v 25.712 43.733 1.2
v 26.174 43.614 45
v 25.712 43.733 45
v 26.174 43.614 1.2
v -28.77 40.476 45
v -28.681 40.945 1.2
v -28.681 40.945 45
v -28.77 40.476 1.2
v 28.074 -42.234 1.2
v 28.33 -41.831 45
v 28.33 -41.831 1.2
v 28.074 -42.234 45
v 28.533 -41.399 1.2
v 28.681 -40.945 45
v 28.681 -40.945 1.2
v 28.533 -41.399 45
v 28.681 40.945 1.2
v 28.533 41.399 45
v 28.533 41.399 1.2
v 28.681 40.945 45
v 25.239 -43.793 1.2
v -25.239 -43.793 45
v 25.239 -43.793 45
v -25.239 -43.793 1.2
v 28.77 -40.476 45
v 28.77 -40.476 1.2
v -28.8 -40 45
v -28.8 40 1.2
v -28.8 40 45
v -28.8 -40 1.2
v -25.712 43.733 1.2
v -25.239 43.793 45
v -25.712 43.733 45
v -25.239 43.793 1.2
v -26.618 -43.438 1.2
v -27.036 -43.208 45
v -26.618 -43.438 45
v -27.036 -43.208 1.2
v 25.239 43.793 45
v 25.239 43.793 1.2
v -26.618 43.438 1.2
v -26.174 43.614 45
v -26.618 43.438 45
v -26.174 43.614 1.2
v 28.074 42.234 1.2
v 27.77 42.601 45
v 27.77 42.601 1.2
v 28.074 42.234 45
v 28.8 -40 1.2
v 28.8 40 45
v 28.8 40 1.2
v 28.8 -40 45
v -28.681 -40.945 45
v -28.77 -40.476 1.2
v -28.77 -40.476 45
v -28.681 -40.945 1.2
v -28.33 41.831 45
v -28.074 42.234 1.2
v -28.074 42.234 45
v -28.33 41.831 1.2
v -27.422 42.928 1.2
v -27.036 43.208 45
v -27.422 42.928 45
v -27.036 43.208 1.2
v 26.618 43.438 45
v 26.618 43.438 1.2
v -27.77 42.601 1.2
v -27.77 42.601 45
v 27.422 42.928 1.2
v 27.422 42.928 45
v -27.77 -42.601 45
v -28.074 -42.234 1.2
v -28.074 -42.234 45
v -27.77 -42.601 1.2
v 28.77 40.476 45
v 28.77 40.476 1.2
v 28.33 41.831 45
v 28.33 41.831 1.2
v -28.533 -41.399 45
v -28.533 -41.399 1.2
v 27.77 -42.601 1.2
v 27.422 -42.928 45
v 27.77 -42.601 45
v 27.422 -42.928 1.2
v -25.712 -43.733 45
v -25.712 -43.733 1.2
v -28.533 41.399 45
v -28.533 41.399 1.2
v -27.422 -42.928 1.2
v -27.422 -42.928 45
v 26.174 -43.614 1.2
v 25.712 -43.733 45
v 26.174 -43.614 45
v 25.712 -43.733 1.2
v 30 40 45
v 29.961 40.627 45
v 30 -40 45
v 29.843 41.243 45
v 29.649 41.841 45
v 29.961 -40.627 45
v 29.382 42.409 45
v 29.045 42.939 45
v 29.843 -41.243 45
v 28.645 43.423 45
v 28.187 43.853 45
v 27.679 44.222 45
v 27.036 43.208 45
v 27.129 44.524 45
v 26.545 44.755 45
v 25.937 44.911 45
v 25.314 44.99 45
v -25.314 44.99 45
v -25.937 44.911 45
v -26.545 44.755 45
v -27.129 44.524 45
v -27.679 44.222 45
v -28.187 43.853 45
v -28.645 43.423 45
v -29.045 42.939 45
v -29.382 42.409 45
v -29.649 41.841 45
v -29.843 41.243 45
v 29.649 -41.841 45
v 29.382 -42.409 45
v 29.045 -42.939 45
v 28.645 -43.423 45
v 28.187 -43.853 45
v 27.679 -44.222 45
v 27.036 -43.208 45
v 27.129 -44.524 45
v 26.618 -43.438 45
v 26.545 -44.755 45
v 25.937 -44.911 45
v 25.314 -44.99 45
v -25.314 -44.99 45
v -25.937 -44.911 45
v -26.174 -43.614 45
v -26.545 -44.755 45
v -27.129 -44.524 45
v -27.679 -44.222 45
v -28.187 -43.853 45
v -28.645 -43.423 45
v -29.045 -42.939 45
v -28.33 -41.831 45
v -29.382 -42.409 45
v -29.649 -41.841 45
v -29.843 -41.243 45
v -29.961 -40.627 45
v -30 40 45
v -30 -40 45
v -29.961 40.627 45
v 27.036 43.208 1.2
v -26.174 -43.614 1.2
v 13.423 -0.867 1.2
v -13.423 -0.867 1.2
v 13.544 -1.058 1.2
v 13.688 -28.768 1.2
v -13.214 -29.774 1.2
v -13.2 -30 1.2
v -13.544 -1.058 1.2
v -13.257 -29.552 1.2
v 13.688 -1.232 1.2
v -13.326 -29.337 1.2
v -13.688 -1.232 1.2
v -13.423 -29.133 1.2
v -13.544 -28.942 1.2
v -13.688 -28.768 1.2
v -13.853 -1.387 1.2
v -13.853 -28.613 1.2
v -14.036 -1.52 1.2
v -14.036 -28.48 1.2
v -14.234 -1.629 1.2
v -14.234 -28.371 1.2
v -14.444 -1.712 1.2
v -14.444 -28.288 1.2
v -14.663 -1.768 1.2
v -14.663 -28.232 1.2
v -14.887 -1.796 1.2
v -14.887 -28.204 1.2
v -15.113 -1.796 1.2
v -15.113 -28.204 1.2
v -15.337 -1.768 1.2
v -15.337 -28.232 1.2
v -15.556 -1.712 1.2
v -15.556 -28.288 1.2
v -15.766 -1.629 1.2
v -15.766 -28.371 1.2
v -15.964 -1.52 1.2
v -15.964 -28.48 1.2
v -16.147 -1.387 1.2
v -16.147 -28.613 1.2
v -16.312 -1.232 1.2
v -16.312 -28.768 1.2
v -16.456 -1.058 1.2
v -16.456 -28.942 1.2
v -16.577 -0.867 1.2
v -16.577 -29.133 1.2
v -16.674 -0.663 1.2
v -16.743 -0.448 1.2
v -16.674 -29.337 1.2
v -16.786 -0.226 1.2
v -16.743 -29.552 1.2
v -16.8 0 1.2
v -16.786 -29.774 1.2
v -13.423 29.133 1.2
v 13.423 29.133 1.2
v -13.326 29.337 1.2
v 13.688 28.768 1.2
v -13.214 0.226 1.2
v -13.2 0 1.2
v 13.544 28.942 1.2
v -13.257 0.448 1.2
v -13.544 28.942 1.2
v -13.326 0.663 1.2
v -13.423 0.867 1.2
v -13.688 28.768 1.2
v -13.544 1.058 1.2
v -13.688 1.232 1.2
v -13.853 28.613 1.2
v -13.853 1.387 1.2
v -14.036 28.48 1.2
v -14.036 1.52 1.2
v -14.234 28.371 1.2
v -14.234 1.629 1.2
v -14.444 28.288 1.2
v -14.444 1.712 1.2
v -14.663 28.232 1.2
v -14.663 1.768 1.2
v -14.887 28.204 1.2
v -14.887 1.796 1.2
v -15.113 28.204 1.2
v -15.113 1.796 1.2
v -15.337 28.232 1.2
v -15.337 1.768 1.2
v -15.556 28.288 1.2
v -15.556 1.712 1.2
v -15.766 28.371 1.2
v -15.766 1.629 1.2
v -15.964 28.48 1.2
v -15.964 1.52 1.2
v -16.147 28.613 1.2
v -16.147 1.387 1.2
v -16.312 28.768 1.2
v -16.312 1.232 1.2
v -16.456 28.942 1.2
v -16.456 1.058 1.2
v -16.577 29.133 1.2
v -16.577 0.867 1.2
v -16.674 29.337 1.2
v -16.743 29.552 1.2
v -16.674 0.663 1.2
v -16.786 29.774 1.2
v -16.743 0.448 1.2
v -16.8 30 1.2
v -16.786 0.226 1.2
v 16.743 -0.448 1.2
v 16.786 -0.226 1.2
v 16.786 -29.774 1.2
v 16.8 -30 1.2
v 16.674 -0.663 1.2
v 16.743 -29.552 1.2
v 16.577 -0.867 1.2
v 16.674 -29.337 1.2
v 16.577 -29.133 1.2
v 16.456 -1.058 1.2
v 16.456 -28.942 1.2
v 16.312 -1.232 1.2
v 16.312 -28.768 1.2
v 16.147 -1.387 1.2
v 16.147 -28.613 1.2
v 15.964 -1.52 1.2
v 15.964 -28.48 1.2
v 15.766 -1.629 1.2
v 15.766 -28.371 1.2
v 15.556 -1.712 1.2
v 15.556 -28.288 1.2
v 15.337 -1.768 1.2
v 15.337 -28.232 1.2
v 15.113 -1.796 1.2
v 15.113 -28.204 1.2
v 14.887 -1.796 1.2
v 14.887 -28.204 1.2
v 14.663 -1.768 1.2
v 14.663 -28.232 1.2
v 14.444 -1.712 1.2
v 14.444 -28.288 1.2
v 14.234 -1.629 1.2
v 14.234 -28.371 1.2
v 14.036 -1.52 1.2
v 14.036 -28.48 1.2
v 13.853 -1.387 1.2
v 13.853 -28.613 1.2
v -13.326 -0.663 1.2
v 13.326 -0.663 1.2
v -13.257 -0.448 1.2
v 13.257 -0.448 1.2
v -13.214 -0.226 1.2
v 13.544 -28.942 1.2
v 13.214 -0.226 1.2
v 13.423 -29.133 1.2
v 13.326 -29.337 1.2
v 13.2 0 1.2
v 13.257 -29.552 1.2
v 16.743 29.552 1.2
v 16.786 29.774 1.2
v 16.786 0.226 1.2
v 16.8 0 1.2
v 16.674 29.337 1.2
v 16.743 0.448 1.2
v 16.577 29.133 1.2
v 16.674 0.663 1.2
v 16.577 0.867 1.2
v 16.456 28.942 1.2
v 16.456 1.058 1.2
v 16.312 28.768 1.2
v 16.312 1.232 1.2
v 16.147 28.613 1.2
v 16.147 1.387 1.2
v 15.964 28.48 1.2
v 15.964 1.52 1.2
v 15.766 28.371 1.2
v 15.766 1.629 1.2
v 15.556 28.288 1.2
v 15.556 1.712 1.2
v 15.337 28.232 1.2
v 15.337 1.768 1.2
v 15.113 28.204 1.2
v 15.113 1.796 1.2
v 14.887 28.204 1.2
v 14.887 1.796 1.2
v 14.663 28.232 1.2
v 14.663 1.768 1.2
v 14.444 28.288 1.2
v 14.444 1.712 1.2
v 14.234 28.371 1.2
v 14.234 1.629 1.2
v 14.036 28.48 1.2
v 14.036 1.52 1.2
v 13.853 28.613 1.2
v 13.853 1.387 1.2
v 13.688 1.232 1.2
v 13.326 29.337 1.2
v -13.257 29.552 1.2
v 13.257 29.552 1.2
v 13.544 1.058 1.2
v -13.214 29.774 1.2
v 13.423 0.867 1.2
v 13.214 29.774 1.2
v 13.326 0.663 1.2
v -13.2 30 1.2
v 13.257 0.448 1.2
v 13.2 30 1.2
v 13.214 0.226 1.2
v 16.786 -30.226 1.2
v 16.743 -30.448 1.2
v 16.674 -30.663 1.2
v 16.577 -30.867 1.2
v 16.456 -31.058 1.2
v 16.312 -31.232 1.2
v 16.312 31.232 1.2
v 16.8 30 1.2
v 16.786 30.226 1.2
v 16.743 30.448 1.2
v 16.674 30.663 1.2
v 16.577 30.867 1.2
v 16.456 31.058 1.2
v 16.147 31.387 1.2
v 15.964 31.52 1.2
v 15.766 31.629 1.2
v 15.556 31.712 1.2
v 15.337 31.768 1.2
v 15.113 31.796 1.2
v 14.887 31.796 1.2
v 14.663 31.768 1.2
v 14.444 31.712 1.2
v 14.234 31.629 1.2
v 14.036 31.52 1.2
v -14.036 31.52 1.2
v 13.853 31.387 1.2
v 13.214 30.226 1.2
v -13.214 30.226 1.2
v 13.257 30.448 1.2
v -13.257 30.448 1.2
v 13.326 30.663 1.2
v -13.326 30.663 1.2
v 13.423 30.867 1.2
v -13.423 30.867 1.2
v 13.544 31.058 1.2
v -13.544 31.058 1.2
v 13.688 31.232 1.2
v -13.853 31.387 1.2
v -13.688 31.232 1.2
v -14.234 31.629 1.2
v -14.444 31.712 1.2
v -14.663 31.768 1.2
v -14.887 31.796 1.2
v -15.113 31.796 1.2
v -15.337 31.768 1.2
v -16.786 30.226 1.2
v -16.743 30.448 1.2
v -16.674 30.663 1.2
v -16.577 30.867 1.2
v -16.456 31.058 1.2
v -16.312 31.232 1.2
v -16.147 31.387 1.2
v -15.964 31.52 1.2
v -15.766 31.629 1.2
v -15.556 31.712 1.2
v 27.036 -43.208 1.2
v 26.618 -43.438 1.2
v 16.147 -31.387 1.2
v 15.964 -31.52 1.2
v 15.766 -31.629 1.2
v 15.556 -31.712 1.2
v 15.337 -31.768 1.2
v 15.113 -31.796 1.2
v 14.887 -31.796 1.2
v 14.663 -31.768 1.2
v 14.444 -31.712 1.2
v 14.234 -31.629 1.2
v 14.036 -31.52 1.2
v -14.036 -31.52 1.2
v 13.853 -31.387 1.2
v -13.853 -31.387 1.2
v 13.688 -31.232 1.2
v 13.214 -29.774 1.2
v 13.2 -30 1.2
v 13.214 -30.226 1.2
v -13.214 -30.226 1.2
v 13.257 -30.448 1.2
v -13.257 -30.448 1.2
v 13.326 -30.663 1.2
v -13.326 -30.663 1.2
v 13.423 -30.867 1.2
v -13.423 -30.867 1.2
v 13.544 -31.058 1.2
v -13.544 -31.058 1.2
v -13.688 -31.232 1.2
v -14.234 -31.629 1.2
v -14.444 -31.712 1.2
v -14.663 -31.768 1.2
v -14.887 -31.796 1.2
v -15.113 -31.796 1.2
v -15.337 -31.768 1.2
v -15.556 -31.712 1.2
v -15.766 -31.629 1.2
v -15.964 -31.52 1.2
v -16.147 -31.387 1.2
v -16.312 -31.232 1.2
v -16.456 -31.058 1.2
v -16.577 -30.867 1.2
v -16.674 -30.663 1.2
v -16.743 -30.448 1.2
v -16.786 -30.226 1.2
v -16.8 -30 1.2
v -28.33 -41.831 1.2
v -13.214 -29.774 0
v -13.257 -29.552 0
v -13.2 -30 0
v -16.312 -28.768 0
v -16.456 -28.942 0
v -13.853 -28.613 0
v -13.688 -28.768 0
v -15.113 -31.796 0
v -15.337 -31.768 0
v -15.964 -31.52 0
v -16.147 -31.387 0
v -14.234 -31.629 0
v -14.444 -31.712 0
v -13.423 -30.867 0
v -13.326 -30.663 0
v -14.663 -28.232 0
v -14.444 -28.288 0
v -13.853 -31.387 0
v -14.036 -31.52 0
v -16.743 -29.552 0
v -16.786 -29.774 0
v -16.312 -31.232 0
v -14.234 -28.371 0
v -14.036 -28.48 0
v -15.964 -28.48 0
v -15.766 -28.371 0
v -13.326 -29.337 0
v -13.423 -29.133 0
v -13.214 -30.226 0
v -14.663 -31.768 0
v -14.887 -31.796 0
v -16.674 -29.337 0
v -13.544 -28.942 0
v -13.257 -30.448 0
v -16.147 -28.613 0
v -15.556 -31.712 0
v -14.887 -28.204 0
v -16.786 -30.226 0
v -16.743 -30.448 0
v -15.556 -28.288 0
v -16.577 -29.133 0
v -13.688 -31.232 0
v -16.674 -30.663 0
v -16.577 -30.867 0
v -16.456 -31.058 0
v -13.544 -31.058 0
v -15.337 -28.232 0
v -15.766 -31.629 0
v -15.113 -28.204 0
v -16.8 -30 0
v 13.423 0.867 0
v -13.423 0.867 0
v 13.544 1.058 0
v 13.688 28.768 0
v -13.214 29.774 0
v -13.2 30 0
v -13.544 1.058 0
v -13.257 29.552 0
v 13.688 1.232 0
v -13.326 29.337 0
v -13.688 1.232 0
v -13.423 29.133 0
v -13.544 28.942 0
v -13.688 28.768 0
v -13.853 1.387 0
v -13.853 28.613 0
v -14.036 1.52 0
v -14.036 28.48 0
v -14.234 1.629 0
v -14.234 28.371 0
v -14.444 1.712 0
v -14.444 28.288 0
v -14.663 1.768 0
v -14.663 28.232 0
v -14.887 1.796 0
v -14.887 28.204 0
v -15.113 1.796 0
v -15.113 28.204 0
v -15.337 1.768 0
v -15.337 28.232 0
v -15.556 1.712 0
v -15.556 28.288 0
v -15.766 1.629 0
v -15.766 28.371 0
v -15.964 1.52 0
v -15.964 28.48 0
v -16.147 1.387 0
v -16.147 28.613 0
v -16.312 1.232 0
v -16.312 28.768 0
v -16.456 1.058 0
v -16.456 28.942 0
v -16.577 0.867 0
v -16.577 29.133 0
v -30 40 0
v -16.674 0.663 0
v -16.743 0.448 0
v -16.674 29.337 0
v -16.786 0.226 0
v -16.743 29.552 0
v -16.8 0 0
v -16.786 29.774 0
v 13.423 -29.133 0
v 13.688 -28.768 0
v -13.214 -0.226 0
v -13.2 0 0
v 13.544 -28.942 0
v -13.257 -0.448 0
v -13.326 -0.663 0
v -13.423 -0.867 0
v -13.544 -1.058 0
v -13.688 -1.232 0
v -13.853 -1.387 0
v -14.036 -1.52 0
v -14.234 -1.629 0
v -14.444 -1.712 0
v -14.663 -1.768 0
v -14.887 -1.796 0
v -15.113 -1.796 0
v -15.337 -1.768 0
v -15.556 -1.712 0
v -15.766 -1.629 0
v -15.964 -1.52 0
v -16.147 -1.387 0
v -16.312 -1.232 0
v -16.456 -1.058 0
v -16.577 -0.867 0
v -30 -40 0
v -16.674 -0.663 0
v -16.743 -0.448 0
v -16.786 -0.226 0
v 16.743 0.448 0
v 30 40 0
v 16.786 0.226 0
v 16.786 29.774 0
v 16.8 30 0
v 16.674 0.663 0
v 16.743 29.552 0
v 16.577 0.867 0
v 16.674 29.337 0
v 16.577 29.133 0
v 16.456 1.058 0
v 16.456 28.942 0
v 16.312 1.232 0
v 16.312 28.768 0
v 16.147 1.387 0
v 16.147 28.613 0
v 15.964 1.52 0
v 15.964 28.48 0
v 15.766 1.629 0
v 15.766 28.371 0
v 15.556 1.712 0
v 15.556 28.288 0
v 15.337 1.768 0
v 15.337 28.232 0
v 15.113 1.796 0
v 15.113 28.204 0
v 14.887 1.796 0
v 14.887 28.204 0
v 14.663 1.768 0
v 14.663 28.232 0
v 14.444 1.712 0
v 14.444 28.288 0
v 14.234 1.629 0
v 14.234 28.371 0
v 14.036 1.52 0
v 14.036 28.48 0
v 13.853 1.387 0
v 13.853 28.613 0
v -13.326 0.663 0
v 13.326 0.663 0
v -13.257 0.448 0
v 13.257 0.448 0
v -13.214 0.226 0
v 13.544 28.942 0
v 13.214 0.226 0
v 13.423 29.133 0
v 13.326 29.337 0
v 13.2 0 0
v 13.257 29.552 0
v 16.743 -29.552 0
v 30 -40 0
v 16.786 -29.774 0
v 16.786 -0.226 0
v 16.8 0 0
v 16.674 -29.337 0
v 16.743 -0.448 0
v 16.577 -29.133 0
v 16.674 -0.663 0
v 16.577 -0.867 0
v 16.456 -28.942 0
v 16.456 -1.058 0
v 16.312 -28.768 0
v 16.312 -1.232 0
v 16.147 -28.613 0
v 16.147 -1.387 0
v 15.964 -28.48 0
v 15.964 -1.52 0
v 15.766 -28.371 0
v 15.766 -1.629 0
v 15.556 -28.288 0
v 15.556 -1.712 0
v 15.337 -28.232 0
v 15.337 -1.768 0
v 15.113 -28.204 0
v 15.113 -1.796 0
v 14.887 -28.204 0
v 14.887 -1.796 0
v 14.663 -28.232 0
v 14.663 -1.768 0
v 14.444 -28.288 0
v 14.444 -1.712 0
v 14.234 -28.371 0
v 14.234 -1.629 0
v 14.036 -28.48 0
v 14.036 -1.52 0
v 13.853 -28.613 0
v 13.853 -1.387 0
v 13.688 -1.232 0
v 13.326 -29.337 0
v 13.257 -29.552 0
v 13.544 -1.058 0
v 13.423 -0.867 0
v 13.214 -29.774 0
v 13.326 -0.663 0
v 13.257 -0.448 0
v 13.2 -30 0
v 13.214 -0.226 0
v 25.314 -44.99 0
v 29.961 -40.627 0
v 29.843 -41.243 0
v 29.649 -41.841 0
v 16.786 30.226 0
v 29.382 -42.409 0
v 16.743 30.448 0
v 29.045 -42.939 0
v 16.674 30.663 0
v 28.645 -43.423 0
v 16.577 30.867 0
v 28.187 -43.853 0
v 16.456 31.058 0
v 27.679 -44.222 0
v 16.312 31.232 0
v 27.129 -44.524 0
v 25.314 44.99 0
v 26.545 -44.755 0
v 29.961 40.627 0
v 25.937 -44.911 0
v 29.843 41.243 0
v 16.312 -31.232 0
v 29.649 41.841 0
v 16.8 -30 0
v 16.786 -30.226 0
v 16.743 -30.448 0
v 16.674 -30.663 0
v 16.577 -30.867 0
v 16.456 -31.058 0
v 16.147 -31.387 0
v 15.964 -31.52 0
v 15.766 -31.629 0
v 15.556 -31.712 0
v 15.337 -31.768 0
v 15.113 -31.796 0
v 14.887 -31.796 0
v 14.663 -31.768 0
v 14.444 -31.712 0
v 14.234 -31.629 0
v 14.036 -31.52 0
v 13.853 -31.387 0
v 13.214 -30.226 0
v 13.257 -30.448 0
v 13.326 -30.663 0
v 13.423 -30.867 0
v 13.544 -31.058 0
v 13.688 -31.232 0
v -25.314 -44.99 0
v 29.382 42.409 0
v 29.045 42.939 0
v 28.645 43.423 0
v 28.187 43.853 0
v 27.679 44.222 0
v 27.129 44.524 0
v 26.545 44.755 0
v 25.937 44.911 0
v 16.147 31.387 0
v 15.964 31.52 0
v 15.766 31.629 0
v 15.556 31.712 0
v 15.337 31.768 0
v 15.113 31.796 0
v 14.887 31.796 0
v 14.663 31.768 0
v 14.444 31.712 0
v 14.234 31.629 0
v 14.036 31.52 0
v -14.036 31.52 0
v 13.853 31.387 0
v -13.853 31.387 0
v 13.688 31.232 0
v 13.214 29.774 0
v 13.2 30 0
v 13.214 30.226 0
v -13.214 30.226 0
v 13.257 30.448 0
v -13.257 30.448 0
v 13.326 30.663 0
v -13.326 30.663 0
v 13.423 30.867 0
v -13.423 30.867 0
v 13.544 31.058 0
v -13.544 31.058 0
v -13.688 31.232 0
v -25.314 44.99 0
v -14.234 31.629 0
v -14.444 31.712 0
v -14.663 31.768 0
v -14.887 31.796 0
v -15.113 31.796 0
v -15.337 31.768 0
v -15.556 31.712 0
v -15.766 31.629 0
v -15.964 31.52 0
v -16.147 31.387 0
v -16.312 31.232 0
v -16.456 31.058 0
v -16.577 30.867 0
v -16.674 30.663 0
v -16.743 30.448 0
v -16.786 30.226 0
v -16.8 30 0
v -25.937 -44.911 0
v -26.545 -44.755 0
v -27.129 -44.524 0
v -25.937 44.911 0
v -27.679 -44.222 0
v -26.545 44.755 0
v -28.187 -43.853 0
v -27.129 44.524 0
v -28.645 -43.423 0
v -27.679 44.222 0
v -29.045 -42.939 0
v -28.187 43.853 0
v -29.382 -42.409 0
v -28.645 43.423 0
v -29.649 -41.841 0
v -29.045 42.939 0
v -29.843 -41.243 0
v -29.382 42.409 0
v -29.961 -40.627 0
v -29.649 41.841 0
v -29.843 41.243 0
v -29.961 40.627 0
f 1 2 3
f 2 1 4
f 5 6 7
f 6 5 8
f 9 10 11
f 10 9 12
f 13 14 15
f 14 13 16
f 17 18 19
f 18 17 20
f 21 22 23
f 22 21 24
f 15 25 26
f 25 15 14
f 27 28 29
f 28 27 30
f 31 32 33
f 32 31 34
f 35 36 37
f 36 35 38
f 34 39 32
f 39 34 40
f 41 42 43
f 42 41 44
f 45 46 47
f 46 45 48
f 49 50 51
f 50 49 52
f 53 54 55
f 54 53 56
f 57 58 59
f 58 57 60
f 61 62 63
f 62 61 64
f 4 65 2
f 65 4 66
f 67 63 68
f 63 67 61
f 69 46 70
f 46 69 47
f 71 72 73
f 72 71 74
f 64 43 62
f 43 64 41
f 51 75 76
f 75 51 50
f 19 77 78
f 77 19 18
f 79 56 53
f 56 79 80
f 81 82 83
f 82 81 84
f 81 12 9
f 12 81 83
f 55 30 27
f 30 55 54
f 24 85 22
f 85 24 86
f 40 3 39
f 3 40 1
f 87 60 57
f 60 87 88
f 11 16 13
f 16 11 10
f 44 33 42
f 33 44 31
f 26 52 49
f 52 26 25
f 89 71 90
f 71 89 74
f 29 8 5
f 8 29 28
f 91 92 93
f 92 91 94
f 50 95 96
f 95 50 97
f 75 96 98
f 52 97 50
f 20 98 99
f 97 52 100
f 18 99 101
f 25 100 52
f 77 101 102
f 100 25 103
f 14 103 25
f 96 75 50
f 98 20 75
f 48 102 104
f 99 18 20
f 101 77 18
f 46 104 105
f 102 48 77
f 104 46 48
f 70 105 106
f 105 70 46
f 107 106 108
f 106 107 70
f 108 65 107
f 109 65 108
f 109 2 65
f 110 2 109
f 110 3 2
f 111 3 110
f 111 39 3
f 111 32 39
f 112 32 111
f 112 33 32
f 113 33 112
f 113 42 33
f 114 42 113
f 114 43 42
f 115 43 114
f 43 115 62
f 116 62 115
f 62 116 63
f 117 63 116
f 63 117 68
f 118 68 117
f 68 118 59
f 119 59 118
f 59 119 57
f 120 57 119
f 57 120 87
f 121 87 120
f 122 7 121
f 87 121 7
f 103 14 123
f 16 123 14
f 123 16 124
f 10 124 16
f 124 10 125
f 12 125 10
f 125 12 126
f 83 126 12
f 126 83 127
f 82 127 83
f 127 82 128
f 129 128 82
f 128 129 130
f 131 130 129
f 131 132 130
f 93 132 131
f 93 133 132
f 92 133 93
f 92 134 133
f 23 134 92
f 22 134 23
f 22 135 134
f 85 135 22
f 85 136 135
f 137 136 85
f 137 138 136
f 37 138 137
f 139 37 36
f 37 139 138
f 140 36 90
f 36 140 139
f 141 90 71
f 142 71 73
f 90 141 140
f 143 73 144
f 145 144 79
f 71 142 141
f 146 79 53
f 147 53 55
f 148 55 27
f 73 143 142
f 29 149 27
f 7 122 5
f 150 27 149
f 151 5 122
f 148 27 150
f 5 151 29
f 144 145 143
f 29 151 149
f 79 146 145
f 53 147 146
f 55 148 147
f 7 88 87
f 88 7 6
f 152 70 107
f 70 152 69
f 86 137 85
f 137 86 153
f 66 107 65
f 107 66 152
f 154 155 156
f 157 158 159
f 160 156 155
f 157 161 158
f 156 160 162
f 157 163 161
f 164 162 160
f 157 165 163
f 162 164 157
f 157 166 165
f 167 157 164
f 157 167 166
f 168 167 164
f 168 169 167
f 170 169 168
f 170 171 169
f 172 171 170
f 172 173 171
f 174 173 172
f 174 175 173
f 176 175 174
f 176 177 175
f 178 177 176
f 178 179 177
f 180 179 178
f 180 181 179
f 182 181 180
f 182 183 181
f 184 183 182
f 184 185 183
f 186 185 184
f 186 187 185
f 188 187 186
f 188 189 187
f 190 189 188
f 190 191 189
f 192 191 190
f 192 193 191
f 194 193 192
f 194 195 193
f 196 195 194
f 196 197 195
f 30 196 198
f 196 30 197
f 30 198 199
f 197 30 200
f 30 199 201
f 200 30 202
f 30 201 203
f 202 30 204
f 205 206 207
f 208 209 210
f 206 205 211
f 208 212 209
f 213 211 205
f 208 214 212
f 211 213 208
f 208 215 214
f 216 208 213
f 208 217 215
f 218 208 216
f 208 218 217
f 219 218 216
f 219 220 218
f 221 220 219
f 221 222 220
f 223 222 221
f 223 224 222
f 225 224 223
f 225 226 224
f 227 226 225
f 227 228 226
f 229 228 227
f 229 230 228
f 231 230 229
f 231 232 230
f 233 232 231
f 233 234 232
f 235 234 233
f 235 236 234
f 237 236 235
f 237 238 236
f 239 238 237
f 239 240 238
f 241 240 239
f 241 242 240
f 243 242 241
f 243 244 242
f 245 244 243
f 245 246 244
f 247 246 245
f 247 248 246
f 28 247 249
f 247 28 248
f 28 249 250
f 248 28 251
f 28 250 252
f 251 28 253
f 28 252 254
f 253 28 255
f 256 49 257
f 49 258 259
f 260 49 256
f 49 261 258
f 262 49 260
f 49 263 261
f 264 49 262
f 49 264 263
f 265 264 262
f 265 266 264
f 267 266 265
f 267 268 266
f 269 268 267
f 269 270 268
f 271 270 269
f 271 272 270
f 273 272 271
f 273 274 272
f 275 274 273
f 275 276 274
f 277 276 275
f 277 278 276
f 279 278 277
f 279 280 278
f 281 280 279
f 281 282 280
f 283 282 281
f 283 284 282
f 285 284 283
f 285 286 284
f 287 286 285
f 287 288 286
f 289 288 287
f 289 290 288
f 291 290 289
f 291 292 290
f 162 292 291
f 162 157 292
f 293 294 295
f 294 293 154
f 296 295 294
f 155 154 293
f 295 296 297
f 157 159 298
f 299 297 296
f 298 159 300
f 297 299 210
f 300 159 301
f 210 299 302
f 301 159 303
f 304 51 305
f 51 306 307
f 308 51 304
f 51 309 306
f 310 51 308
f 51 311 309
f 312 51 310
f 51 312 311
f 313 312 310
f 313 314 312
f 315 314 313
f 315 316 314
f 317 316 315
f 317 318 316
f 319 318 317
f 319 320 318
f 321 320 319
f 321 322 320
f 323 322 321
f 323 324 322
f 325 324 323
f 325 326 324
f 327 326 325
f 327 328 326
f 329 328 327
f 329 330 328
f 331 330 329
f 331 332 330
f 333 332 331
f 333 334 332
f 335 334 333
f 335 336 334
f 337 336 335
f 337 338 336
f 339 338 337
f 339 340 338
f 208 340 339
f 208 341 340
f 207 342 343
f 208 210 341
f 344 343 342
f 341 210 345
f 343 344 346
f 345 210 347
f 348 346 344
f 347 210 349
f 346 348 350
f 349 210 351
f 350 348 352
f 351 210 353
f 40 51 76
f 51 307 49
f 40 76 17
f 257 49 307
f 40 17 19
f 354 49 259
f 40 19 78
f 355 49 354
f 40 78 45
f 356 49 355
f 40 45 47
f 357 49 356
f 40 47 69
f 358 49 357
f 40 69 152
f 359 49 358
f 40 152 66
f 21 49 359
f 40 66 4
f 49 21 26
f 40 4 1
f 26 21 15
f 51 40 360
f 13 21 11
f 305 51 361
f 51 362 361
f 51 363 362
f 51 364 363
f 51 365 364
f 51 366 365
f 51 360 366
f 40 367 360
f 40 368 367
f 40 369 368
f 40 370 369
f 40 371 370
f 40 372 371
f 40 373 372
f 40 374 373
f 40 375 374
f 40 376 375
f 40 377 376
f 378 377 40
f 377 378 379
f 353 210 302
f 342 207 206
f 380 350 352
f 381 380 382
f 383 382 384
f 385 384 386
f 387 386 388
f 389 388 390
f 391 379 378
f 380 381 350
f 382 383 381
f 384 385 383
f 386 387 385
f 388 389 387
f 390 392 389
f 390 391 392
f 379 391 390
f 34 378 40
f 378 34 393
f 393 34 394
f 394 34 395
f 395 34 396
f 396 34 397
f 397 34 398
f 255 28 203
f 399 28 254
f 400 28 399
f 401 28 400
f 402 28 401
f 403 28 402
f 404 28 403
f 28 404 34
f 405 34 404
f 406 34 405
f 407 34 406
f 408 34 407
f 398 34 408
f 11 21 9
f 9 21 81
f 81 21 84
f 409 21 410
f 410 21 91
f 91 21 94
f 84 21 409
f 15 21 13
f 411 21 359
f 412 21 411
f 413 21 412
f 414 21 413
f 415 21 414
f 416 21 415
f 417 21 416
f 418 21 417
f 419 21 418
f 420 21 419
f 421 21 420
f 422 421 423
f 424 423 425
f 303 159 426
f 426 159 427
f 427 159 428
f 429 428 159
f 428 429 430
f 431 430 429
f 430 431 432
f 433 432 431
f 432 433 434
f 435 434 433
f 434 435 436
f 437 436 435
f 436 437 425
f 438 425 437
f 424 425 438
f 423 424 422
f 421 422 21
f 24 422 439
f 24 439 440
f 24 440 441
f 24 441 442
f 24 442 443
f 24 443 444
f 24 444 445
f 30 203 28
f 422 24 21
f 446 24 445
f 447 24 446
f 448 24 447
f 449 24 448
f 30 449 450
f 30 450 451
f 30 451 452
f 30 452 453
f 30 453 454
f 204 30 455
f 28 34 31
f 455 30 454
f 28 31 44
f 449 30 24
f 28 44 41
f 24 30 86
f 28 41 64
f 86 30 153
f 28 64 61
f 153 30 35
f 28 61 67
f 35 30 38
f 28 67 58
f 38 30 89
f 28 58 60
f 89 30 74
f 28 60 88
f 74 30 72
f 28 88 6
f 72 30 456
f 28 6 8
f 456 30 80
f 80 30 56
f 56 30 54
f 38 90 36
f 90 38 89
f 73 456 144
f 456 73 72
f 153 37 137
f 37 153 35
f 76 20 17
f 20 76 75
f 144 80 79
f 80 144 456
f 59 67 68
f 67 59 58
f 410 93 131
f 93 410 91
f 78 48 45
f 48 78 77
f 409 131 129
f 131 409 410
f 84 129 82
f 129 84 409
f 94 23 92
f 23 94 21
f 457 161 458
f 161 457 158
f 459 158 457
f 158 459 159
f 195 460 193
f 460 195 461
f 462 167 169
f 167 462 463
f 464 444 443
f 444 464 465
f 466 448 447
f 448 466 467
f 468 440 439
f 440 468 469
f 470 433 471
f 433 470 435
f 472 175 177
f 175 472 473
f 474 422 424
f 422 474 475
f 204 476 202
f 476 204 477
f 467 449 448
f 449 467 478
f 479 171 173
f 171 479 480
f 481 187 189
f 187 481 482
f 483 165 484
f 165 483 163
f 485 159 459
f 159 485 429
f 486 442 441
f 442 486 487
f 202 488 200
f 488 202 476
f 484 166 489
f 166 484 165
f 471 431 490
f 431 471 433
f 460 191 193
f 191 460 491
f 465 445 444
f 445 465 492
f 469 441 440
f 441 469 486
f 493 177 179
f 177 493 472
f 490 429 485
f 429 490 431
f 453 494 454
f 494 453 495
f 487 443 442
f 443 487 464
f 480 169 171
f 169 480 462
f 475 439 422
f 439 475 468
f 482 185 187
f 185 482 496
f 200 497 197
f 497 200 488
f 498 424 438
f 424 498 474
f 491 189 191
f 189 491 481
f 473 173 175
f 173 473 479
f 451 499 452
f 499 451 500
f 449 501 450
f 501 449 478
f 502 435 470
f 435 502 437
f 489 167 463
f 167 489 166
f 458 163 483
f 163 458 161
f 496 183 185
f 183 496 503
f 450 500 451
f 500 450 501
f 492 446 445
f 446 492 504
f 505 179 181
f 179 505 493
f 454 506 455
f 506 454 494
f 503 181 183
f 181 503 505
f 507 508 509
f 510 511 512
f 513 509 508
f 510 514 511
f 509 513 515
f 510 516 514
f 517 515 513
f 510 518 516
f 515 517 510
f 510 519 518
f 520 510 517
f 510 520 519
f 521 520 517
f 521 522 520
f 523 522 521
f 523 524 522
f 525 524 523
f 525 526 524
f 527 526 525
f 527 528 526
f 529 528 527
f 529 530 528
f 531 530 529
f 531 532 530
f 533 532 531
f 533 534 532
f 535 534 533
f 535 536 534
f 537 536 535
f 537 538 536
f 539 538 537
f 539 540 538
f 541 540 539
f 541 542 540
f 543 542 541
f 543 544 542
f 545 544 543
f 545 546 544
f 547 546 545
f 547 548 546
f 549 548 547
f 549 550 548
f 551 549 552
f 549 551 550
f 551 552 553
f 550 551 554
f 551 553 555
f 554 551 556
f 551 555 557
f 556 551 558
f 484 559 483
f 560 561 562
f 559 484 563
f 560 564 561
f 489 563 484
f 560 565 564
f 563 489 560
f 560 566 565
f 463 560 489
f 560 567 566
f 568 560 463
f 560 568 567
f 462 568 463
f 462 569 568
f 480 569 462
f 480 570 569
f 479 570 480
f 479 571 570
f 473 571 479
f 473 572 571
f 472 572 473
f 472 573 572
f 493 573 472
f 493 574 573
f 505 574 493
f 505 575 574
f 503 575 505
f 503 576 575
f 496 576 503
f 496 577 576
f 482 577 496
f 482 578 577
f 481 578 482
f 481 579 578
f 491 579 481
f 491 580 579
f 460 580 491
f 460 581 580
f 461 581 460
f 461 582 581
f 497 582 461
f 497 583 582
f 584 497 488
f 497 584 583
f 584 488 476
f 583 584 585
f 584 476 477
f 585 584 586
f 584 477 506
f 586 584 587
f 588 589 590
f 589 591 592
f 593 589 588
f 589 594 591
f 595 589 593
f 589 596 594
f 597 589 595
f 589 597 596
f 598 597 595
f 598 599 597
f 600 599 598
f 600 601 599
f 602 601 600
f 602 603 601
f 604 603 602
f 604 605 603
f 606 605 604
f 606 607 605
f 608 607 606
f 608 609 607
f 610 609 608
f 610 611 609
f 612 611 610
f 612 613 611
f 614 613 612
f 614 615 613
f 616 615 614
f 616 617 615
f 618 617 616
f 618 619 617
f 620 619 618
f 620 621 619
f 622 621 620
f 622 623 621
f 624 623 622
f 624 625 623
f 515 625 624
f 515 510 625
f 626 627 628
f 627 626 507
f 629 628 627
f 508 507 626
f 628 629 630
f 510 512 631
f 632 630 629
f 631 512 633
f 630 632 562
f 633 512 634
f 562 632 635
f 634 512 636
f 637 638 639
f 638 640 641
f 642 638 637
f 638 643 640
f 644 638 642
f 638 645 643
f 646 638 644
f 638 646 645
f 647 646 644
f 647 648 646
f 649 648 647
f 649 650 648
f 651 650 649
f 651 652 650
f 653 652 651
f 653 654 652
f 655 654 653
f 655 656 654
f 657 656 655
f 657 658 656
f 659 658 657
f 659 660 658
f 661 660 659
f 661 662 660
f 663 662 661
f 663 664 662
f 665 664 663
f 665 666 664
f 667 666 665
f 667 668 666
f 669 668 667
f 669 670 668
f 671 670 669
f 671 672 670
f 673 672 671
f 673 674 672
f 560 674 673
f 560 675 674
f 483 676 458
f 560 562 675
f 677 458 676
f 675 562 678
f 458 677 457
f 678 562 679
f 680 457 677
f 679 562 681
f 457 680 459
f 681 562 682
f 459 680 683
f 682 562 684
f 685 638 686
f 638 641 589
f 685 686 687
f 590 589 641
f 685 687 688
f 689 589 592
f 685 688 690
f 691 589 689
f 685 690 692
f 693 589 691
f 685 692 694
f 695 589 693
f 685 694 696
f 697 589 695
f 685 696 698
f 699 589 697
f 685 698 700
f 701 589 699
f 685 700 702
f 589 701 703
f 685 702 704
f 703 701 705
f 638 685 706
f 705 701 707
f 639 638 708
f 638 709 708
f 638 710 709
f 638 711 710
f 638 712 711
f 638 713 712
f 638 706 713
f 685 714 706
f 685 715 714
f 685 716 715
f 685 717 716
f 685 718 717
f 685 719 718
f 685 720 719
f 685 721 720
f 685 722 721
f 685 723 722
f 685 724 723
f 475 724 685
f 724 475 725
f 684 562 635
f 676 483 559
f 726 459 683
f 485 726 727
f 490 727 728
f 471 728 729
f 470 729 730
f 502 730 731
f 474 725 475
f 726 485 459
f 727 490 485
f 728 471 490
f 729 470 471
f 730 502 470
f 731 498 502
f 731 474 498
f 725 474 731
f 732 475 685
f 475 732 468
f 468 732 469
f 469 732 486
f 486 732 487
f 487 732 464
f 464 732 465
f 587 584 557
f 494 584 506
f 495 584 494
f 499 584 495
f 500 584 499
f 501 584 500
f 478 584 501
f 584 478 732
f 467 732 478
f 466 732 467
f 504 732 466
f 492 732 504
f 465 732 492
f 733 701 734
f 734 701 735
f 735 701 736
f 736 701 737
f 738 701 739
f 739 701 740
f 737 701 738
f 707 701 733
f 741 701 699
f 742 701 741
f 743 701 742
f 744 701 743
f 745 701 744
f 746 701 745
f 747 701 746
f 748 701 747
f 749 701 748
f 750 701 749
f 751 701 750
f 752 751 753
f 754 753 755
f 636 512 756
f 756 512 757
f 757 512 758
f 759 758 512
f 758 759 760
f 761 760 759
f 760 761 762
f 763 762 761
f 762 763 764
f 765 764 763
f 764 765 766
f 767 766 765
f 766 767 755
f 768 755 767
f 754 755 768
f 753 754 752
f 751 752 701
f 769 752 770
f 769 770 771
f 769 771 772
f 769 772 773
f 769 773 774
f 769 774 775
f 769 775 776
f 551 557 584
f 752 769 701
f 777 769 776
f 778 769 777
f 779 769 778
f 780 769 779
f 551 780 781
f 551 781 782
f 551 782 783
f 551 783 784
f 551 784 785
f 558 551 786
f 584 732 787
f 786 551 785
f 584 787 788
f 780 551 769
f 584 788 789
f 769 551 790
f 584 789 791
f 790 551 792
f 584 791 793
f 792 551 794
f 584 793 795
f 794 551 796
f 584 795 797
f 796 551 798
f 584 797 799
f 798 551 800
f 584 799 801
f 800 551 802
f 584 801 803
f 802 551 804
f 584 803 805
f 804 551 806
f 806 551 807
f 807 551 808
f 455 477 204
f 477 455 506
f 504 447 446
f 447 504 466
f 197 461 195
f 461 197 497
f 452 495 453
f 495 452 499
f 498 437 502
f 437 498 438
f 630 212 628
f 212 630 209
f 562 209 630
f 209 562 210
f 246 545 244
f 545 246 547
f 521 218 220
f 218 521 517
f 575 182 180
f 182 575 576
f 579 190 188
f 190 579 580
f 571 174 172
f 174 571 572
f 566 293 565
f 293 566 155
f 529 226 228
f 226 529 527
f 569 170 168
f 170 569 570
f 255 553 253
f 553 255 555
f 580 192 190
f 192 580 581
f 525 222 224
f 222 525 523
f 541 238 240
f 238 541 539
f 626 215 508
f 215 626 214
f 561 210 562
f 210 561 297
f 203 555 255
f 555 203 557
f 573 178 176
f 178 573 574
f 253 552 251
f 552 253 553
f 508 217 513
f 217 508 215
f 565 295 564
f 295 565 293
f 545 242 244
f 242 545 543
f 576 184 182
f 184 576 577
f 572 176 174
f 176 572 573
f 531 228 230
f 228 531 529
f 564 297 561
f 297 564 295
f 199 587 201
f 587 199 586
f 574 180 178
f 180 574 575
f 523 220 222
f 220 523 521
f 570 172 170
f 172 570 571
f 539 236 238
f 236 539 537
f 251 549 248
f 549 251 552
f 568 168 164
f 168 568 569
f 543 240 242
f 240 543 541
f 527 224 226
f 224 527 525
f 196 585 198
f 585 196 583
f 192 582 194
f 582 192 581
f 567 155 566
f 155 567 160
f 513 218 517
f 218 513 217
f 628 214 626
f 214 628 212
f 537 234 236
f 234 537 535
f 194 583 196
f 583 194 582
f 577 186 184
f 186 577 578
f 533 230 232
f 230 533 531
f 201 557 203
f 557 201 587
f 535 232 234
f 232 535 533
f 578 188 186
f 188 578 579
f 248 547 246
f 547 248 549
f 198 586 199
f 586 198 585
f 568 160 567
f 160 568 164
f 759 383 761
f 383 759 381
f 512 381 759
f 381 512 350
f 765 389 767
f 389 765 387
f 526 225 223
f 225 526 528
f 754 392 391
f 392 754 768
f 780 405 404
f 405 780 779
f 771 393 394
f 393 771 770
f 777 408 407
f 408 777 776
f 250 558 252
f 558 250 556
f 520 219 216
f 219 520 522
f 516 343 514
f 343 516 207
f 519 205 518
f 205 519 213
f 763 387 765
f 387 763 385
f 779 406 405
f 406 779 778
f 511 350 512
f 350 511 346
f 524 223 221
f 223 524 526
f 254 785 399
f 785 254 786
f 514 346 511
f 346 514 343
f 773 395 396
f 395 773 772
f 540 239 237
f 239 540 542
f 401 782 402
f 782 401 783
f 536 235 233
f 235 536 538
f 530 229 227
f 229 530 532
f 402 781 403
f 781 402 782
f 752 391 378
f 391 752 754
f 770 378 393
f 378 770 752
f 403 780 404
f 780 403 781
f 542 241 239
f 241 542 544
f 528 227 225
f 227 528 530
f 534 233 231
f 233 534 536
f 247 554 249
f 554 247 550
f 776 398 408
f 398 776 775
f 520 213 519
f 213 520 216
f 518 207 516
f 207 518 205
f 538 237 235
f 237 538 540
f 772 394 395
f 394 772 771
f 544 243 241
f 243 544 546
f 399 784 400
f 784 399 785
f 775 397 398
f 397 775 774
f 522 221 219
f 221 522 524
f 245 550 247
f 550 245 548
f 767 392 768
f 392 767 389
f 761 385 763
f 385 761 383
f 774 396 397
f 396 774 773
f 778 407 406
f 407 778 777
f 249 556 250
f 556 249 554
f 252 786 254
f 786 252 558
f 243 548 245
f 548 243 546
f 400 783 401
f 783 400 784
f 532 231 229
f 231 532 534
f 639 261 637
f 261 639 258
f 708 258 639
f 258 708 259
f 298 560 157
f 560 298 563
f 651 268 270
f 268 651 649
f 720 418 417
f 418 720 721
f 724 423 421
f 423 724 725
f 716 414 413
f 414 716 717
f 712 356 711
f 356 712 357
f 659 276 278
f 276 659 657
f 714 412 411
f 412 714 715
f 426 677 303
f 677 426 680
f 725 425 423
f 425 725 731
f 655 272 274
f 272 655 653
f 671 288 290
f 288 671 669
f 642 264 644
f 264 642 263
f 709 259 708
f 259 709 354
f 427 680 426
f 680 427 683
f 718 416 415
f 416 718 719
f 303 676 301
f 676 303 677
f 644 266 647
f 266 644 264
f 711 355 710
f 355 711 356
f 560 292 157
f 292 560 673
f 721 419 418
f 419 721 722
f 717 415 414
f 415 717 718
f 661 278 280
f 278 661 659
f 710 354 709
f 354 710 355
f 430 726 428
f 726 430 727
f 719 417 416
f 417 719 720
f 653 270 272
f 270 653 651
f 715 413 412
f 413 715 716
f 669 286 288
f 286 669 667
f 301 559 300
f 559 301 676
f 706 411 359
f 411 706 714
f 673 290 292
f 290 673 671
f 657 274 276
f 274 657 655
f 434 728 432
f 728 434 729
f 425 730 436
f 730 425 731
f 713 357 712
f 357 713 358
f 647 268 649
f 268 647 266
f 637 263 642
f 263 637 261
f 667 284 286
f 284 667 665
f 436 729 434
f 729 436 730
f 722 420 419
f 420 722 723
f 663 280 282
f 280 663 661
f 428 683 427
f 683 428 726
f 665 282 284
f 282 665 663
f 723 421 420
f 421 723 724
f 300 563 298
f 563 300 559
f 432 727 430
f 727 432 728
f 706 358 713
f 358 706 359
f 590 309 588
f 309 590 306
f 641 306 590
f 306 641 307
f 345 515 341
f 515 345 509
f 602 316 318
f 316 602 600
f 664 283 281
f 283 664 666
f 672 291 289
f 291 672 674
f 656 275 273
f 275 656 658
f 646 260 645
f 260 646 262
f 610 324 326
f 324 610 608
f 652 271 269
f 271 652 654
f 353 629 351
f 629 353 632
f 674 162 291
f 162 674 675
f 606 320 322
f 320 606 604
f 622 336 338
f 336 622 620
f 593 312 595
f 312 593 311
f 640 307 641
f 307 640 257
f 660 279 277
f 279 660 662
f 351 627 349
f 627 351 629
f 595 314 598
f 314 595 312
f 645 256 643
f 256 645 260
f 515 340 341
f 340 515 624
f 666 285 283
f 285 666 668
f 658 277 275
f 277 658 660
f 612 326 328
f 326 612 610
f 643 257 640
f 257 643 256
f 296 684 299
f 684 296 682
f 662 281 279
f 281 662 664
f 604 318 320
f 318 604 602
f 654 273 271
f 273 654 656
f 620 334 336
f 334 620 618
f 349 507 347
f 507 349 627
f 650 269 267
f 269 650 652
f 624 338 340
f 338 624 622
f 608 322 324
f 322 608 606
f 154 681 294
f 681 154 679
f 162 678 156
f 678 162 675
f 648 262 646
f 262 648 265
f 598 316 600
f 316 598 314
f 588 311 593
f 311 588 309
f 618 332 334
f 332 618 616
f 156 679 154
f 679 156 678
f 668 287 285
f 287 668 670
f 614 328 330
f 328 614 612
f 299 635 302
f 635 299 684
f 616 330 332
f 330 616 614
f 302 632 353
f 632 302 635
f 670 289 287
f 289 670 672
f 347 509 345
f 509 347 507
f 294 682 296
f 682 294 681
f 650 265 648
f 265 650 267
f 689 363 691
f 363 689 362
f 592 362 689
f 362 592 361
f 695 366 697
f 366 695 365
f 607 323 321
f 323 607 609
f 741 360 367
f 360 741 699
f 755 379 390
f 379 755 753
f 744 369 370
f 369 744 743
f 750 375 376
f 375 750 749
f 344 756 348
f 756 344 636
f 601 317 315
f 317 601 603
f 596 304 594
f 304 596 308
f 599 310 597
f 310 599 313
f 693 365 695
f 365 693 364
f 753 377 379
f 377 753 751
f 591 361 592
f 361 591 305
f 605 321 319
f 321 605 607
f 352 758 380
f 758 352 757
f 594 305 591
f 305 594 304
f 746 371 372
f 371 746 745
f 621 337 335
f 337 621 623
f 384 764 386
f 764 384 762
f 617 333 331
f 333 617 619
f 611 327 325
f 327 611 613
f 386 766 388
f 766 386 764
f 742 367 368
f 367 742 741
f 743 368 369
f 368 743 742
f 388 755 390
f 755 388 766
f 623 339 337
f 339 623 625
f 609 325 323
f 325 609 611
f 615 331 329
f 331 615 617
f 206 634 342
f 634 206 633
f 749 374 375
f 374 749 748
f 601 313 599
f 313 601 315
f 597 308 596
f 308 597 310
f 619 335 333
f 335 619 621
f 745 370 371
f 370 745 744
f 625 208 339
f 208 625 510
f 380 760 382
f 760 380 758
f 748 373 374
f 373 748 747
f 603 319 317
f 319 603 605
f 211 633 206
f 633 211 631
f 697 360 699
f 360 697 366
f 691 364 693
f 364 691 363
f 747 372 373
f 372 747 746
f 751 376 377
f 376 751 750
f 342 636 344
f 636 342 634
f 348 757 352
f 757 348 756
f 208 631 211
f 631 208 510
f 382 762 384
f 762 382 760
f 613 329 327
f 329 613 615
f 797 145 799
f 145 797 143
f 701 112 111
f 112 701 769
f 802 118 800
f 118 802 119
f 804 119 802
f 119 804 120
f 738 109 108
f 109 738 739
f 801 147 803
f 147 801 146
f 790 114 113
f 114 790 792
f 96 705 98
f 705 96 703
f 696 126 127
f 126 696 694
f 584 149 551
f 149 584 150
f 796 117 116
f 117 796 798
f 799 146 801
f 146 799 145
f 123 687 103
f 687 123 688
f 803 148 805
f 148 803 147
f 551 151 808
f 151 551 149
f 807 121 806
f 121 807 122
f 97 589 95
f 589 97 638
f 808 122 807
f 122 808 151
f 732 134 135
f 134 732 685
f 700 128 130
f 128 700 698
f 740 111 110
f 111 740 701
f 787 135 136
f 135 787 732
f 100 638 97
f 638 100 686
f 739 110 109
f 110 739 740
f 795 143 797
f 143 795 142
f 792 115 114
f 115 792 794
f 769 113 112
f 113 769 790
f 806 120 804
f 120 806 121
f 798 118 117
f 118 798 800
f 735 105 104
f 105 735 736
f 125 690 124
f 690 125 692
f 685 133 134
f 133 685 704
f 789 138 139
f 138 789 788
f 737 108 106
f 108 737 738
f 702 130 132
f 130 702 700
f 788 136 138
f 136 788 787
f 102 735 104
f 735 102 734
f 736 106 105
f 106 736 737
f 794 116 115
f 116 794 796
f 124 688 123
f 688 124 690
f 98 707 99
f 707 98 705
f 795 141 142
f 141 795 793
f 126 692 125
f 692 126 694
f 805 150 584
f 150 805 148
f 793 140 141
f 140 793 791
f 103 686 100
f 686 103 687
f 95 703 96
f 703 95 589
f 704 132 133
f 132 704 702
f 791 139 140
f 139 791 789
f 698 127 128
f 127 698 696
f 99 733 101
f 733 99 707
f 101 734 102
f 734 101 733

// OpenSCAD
$fn = 50;


difference() {
	union() {
		hull() {
			translate(v = [-25.0000000000, 40.0000000000, 0]) {
				cylinder(h = 45, r = 5);
			}
			translate(v = [25.0000000000, 40.0000000000, 0]) {
				cylinder(h = 45, r = 5);
			}
			translate(v = [-25.0000000000, -40.0000000000, 0]) {
				cylinder(h = 45, r = 5);
			}
			translate(v = [25.0000000000, -40.0000000000, 0]) {
				cylinder(h = 45, r = 5);
			}
		}
	}
	union() {
		translate(v = [0, 0, 1.2000000000]) {
			hull() {
				translate(v = [-25.0000000000, 40.0000000000, 0]) {
					cylinder(h = 43.8000000000, r = 3.8000000000);
				}
				translate(v = [25.0000000000, 40.0000000000, 0]) {
					cylinder(h = 43.8000000000, r = 3.8000000000);
				}
				translate(v = [-25.0000000000, -40.0000000000, 0]) {
					cylinder(h = 43.8000000000, r = 3.8000000000);
				}
				translate(v = [25.0000000000, -40.0000000000, 0]) {
					cylinder(h = 43.8000000000, r = 3.8000000000);
				}
			}
		}
		#translate(v = [-15.0000000000, -30.0000000000, 0]) {
			cylinder(h = 1.2000000000, r = 1.8000000000);
		}
		#translate(v = [-15.0000000000, 0.0000000000, 0]) {
			cylinder(h = 1.2000000000, r = 1.8000000000);
		}
		#translate(v = [-15.0000000000, 30.0000000000, 0]) {
			cylinder(h = 1.2000000000, r = 1.8000000000);
		}
		#translate(v = [15.0000000000, -30.0000000000, 0]) {
			cylinder(h = 1.2000000000, r = 1.8000000000);
		}
		#translate(v = [15.0000000000, 0.0000000000, 0]) {
			cylinder(h = 1.2000000000, r = 1.8000000000);
		}
		#translate(v = [15.0000000000, 30.0000000000, 0]) {
			cylinder(h = 1.2000000000, r = 1.8000000000);
		}
	}
}
